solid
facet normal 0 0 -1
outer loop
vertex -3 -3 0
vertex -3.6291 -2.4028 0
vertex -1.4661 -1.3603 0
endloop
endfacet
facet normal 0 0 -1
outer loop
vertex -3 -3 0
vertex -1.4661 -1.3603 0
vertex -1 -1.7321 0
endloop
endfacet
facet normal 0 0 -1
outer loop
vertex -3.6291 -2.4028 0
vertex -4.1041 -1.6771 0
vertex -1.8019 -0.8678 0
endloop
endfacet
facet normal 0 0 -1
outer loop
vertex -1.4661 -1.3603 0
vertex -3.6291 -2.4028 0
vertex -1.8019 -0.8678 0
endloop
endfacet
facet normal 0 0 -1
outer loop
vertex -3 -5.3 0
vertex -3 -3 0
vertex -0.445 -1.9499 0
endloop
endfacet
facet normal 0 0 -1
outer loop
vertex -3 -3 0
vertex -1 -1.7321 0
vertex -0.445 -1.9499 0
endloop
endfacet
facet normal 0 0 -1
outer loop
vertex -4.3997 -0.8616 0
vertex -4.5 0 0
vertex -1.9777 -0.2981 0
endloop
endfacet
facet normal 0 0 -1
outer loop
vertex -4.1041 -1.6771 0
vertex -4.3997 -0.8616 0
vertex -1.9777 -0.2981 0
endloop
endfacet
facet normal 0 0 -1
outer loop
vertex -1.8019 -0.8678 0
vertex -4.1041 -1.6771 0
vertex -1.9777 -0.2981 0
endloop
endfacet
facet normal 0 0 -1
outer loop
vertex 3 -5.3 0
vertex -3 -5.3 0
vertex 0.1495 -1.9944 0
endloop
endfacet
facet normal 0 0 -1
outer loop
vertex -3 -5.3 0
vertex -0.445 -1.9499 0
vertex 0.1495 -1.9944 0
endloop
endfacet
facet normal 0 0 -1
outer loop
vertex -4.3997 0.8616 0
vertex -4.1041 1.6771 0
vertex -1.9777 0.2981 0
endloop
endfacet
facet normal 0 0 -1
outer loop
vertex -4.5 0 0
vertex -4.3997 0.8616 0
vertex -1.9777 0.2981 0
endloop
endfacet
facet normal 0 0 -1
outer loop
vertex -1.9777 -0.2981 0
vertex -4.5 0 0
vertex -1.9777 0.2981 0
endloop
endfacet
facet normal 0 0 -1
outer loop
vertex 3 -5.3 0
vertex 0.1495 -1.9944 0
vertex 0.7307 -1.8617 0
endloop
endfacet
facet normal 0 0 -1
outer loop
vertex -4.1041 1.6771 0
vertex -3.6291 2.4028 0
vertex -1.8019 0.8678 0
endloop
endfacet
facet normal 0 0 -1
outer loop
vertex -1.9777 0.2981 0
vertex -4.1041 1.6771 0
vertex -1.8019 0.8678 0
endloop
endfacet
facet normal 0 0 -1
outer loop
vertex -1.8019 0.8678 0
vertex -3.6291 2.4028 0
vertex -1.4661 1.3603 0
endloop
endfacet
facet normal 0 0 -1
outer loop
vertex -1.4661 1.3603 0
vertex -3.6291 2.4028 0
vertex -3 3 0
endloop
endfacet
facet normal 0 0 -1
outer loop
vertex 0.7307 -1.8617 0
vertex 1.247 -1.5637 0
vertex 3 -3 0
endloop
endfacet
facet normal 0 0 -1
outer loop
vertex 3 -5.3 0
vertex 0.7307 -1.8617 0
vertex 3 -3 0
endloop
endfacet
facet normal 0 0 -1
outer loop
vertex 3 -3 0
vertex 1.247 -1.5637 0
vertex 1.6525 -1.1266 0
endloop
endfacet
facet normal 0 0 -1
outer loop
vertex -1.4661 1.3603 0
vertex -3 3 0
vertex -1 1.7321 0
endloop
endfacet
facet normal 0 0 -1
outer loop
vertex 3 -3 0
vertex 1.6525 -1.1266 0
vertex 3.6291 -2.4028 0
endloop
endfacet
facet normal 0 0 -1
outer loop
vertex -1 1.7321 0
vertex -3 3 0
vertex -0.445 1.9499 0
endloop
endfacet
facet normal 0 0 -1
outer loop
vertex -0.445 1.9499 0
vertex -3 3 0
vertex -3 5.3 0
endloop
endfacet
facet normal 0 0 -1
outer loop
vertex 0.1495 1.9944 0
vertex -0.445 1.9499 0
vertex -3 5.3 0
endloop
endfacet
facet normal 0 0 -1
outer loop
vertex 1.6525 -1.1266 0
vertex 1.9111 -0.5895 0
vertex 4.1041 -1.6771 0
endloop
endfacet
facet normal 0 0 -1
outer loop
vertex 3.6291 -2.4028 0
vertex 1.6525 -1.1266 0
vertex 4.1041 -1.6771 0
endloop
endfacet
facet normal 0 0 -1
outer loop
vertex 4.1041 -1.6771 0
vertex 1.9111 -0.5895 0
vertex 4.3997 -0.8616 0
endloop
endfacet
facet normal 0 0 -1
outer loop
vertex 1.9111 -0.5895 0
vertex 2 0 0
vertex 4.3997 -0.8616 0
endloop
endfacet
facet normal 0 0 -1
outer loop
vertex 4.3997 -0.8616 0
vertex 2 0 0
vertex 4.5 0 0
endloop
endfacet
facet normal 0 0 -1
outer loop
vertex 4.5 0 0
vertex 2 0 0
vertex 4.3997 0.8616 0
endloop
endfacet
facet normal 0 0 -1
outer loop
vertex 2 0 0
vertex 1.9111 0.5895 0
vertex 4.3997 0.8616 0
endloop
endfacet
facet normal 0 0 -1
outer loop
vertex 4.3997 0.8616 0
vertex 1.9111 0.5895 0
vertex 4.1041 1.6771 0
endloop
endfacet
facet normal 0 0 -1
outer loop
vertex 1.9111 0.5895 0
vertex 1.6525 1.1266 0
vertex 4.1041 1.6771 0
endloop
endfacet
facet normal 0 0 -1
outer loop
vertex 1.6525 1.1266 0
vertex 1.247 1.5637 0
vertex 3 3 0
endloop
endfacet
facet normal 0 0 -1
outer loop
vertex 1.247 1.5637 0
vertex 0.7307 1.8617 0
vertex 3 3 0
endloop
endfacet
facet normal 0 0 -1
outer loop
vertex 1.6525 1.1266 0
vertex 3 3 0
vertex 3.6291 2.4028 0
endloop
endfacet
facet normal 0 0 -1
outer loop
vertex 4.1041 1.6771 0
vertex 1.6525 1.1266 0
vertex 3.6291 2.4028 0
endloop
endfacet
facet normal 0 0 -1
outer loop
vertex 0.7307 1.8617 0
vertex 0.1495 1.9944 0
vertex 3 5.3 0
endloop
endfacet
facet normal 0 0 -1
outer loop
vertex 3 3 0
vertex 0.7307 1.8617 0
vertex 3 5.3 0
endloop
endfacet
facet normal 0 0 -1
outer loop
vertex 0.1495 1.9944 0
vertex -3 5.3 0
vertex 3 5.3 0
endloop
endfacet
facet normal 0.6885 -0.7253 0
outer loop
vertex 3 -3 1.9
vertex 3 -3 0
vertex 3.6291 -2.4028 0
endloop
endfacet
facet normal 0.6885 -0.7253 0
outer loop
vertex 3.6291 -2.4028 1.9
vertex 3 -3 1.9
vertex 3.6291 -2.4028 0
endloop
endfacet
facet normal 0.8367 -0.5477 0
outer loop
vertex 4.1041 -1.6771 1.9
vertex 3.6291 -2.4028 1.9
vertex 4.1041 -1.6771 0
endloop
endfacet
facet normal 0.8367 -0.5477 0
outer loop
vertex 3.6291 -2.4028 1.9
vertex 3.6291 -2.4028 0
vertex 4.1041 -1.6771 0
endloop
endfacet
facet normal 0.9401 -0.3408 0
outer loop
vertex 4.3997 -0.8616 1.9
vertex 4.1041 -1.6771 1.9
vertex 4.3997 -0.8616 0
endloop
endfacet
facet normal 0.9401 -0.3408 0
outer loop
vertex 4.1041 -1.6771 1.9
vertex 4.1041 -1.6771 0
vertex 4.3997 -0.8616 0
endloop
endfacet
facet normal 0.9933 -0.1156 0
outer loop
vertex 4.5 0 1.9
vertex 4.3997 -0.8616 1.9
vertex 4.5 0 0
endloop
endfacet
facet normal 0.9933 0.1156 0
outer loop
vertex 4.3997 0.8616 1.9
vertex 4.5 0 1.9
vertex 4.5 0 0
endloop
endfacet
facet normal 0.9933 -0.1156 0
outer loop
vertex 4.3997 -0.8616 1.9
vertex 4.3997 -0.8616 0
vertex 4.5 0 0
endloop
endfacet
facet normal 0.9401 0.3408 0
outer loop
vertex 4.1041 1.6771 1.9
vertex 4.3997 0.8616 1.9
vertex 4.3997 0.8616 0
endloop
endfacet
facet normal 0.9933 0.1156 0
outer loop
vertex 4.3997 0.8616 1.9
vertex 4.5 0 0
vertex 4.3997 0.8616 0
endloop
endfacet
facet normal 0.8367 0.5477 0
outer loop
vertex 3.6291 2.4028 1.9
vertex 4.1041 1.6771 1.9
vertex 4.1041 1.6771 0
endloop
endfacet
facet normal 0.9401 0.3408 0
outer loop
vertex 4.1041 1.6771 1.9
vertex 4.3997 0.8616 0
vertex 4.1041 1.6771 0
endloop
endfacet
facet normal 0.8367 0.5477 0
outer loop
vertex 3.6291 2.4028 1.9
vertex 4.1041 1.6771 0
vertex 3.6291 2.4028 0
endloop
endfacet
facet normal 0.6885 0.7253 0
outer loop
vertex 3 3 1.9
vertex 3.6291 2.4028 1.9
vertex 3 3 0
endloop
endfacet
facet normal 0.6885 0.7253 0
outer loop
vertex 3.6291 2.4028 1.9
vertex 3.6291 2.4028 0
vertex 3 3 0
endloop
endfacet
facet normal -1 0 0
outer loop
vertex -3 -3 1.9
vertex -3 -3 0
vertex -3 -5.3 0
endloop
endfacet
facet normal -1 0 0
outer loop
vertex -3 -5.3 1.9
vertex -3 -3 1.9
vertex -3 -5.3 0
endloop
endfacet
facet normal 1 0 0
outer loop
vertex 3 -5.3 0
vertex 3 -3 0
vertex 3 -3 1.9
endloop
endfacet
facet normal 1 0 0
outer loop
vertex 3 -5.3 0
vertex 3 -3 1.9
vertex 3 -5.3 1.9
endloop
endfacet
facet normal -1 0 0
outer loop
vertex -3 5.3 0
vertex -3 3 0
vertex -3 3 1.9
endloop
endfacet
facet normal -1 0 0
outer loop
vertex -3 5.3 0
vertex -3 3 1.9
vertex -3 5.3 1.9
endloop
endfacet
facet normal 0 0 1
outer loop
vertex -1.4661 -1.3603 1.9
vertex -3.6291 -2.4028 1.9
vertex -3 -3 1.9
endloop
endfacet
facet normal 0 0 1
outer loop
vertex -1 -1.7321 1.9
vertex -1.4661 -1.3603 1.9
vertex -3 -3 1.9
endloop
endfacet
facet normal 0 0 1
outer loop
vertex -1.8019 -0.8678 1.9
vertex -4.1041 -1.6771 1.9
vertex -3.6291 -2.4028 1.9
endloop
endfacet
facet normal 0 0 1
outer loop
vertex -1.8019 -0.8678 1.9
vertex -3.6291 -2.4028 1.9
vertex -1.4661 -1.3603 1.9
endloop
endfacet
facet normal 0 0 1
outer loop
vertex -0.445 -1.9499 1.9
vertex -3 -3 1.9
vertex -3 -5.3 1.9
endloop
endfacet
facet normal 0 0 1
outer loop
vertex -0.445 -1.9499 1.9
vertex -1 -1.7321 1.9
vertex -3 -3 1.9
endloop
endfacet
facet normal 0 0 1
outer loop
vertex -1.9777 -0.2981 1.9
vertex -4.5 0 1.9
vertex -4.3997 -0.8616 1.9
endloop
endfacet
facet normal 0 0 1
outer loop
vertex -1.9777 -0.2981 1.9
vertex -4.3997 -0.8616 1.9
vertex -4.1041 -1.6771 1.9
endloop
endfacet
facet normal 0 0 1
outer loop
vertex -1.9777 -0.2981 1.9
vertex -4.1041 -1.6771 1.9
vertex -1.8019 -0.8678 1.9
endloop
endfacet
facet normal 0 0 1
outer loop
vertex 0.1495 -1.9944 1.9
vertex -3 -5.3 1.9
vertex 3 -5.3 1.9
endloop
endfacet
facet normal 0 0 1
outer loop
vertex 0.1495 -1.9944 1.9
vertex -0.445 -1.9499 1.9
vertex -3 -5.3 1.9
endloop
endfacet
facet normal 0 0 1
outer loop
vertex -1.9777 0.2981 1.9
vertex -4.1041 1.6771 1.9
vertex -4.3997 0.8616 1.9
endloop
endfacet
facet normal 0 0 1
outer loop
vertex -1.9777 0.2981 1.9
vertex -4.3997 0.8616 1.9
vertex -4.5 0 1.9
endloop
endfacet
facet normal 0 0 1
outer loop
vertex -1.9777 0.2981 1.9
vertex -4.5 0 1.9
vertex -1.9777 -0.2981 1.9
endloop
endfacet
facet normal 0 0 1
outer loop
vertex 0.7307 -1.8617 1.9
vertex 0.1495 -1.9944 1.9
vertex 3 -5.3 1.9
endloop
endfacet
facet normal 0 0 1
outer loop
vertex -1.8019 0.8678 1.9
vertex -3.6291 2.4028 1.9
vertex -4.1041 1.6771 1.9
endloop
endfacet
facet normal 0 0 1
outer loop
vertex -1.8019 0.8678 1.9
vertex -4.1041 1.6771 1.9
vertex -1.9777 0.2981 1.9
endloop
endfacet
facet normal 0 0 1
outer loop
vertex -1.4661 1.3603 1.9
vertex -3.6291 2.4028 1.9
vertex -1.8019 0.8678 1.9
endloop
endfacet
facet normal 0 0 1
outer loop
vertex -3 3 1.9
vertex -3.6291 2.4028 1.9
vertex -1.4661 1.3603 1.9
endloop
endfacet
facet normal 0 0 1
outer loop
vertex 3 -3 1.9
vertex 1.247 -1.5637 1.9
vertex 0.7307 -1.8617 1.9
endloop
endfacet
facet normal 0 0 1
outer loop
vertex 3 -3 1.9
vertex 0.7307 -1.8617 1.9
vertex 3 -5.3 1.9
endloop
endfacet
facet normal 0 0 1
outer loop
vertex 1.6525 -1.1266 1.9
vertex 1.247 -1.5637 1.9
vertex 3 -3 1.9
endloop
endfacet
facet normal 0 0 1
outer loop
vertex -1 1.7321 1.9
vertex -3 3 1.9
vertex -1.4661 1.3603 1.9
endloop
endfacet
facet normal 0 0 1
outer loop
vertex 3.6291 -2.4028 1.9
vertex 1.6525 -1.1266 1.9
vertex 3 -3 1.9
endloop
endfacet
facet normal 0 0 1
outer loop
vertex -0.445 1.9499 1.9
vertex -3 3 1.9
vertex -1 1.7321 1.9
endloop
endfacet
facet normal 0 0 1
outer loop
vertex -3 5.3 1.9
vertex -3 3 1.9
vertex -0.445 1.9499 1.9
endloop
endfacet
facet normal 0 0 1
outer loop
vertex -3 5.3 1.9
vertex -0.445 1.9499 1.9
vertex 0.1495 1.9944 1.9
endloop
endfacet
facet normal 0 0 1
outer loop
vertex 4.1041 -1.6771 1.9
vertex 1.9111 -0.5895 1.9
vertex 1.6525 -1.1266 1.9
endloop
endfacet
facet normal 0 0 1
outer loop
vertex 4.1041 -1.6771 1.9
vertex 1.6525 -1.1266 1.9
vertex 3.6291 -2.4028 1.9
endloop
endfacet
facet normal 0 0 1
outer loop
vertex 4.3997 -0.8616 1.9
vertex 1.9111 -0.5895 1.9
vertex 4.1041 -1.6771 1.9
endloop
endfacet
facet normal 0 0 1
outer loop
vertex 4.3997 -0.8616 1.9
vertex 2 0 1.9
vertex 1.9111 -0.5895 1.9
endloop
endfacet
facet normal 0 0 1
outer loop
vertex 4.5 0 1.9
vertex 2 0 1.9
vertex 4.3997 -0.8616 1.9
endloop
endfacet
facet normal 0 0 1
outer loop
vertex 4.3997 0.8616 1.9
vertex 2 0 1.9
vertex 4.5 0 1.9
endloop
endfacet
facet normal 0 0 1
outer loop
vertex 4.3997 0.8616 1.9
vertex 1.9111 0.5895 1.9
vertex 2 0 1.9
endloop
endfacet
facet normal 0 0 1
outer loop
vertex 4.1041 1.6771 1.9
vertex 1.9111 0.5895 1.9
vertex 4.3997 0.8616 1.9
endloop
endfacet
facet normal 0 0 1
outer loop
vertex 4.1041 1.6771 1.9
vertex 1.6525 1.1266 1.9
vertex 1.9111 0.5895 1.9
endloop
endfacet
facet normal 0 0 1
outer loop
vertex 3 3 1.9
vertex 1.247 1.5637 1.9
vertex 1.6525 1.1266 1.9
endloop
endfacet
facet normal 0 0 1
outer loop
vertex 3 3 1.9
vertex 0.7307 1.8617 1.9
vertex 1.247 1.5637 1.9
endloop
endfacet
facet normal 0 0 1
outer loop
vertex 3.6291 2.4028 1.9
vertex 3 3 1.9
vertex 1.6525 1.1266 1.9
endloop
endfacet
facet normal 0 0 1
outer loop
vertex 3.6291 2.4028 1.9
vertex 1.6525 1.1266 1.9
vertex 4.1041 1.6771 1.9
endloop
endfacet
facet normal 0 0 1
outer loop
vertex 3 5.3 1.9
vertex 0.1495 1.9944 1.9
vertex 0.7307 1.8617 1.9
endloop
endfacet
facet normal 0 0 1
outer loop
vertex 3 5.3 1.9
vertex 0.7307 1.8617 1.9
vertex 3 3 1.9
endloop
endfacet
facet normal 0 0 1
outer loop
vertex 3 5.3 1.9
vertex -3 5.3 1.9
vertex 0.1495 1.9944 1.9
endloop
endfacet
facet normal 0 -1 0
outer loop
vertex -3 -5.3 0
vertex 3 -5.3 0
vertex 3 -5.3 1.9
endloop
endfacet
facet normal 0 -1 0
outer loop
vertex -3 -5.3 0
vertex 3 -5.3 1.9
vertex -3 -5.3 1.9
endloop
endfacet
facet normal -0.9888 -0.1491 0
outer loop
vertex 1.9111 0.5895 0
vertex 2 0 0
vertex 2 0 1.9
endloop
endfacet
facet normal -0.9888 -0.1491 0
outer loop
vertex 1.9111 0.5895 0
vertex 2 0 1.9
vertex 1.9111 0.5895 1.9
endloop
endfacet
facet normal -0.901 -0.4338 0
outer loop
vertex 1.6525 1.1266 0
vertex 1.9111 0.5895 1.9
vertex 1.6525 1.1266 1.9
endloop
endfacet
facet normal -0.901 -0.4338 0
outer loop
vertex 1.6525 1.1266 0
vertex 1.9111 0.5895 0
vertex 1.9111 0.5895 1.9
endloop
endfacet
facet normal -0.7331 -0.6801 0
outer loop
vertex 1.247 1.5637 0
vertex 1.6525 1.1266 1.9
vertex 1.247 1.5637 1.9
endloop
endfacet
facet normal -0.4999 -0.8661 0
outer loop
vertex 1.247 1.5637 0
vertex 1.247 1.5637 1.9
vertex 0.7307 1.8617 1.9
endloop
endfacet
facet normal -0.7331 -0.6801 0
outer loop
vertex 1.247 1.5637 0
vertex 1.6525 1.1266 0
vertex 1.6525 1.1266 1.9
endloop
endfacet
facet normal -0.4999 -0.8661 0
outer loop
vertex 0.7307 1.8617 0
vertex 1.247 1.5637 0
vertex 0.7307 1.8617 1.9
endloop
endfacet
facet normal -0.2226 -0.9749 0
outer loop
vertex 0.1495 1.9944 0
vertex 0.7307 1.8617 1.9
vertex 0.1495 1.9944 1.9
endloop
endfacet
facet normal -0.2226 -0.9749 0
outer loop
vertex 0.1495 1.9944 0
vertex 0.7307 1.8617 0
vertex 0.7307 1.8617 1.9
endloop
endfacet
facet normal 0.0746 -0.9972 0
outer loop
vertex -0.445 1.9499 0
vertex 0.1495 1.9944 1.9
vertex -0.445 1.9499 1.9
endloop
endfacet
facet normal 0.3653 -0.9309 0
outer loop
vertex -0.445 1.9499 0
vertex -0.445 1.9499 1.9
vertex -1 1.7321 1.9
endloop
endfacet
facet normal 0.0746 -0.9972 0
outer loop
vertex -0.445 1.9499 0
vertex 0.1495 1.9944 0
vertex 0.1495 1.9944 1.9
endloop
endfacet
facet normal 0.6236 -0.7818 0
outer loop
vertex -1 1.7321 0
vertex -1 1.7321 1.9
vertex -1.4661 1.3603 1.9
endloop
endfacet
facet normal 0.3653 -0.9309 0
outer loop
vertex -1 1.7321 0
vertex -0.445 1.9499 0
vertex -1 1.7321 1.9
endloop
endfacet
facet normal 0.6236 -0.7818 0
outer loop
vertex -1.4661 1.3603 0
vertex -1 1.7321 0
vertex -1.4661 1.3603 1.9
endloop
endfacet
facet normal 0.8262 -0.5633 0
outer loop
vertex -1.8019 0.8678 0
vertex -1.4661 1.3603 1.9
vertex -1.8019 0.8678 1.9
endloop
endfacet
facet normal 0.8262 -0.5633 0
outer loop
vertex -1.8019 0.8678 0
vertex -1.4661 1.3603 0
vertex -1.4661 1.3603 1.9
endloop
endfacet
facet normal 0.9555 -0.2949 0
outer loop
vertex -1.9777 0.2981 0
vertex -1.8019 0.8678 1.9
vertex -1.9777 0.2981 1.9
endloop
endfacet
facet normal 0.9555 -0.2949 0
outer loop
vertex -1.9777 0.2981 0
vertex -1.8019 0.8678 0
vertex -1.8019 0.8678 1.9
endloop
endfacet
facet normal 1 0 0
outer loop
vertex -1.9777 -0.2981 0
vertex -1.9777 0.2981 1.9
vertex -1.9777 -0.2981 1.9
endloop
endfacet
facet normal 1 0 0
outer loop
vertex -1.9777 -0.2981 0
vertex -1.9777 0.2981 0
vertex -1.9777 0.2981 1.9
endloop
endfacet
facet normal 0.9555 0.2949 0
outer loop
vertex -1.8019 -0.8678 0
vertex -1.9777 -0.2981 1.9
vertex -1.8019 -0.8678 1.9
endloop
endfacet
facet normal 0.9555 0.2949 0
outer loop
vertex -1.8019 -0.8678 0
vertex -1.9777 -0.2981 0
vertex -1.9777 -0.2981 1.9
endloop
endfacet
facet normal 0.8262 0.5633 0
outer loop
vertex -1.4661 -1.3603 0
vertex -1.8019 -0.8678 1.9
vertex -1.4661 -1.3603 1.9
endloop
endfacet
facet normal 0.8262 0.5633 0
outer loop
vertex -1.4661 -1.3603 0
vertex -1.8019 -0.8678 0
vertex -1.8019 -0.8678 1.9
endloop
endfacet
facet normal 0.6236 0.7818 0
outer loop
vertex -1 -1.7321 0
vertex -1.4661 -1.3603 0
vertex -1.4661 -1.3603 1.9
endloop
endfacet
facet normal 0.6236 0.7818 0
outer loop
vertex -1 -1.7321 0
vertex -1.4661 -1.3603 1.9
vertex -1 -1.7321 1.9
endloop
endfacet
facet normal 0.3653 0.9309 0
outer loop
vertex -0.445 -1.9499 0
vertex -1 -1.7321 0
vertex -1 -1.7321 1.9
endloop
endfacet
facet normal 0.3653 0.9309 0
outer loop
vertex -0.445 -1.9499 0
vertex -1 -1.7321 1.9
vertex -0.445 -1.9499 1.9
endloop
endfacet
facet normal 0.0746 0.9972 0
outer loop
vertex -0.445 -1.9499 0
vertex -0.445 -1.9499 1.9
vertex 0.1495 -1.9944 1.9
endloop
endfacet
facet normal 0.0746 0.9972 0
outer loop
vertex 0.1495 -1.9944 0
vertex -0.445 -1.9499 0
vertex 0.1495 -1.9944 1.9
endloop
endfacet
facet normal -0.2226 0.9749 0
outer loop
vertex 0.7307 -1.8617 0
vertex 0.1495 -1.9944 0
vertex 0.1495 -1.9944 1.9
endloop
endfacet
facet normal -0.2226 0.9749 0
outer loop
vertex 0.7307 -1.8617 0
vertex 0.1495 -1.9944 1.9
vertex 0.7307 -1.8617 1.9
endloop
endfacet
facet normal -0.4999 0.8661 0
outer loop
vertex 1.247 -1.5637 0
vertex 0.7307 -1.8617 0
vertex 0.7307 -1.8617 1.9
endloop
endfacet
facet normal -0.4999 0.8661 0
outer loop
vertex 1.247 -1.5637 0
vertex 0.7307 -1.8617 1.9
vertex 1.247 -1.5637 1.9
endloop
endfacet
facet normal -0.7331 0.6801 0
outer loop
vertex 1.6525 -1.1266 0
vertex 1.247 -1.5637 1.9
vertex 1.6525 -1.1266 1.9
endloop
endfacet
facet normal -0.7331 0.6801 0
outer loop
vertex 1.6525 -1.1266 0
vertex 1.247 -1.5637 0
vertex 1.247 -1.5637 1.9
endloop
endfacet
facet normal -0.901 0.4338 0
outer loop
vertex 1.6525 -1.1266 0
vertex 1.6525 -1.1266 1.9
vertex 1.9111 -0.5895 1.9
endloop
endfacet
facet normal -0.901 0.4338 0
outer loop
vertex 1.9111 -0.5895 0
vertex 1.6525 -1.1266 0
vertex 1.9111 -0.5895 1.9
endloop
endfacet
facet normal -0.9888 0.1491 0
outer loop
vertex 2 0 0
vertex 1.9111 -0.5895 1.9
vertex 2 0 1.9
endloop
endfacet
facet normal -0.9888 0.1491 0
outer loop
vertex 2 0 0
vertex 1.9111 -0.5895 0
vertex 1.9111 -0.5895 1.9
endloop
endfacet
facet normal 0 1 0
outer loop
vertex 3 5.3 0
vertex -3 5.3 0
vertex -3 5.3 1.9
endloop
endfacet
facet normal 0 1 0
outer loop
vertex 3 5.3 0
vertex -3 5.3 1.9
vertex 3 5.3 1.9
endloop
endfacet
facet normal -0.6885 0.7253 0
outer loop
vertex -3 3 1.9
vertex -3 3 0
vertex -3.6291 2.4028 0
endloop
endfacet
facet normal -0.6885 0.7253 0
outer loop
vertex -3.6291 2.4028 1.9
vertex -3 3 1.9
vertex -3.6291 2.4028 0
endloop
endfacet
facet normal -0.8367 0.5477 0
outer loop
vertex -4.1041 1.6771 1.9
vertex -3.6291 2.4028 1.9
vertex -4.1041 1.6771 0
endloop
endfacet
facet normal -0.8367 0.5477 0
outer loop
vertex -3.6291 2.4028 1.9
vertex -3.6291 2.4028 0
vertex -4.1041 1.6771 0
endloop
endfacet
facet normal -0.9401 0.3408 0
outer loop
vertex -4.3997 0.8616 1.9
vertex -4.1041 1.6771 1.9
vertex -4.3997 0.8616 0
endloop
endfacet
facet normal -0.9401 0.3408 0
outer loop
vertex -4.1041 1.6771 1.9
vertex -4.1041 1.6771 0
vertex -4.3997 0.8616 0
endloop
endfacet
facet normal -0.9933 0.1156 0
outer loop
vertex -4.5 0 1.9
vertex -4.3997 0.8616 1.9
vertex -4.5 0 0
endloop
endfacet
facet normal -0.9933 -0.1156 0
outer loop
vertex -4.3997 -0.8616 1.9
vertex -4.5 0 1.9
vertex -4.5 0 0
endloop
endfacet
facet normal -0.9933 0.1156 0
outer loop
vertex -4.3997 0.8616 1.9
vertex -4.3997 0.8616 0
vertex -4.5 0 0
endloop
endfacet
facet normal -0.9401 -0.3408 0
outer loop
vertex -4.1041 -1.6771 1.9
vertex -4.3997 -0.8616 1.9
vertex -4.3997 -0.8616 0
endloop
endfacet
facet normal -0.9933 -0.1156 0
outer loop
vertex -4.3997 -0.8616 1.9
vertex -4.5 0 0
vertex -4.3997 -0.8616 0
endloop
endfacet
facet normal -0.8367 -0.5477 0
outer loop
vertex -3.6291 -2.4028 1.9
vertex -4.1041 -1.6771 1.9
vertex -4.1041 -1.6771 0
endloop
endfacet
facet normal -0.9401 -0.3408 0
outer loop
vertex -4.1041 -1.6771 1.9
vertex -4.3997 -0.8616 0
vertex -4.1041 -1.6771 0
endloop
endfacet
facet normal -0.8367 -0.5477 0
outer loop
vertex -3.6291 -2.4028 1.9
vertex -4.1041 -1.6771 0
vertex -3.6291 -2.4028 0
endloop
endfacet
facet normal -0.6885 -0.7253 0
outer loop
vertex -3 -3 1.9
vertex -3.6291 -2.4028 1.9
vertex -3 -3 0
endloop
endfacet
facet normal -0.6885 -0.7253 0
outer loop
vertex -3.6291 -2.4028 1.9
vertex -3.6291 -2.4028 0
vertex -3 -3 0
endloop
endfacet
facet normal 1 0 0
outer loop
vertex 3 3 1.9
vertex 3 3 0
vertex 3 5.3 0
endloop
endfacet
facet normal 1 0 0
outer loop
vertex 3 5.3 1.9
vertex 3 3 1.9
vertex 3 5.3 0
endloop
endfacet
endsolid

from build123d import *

# Parameters (mm, degrees)
SKETCH_R  = 2
PAD_DEPTH = 1.9


with BuildPart() as part:
    # Sketch → Pad (new body)
    with BuildSketch(Plane.XY):
        with BuildLine():
            ThreePointArc((3, -3), (4.5, 0), (3, 3))
            Line((3, 3), (3, 5.3))
            Line((-3, 5.3), (3, 5.3))
            Line((-3, 3), (-3, 5.3))
            ThreePointArc((-3, 3), (-4.5, 0), (-3, -3))
            Line((-3, -3), (-3, -5.3))
            Line((3, -5.3), (-3, -5.3))
            Line((3, -3), (3, -5.3))
        make_face()
        Circle(SKETCH_R, mode=Mode.SUBTRACT)
    extrude(amount=PAD_DEPTH)


solid = part.part
